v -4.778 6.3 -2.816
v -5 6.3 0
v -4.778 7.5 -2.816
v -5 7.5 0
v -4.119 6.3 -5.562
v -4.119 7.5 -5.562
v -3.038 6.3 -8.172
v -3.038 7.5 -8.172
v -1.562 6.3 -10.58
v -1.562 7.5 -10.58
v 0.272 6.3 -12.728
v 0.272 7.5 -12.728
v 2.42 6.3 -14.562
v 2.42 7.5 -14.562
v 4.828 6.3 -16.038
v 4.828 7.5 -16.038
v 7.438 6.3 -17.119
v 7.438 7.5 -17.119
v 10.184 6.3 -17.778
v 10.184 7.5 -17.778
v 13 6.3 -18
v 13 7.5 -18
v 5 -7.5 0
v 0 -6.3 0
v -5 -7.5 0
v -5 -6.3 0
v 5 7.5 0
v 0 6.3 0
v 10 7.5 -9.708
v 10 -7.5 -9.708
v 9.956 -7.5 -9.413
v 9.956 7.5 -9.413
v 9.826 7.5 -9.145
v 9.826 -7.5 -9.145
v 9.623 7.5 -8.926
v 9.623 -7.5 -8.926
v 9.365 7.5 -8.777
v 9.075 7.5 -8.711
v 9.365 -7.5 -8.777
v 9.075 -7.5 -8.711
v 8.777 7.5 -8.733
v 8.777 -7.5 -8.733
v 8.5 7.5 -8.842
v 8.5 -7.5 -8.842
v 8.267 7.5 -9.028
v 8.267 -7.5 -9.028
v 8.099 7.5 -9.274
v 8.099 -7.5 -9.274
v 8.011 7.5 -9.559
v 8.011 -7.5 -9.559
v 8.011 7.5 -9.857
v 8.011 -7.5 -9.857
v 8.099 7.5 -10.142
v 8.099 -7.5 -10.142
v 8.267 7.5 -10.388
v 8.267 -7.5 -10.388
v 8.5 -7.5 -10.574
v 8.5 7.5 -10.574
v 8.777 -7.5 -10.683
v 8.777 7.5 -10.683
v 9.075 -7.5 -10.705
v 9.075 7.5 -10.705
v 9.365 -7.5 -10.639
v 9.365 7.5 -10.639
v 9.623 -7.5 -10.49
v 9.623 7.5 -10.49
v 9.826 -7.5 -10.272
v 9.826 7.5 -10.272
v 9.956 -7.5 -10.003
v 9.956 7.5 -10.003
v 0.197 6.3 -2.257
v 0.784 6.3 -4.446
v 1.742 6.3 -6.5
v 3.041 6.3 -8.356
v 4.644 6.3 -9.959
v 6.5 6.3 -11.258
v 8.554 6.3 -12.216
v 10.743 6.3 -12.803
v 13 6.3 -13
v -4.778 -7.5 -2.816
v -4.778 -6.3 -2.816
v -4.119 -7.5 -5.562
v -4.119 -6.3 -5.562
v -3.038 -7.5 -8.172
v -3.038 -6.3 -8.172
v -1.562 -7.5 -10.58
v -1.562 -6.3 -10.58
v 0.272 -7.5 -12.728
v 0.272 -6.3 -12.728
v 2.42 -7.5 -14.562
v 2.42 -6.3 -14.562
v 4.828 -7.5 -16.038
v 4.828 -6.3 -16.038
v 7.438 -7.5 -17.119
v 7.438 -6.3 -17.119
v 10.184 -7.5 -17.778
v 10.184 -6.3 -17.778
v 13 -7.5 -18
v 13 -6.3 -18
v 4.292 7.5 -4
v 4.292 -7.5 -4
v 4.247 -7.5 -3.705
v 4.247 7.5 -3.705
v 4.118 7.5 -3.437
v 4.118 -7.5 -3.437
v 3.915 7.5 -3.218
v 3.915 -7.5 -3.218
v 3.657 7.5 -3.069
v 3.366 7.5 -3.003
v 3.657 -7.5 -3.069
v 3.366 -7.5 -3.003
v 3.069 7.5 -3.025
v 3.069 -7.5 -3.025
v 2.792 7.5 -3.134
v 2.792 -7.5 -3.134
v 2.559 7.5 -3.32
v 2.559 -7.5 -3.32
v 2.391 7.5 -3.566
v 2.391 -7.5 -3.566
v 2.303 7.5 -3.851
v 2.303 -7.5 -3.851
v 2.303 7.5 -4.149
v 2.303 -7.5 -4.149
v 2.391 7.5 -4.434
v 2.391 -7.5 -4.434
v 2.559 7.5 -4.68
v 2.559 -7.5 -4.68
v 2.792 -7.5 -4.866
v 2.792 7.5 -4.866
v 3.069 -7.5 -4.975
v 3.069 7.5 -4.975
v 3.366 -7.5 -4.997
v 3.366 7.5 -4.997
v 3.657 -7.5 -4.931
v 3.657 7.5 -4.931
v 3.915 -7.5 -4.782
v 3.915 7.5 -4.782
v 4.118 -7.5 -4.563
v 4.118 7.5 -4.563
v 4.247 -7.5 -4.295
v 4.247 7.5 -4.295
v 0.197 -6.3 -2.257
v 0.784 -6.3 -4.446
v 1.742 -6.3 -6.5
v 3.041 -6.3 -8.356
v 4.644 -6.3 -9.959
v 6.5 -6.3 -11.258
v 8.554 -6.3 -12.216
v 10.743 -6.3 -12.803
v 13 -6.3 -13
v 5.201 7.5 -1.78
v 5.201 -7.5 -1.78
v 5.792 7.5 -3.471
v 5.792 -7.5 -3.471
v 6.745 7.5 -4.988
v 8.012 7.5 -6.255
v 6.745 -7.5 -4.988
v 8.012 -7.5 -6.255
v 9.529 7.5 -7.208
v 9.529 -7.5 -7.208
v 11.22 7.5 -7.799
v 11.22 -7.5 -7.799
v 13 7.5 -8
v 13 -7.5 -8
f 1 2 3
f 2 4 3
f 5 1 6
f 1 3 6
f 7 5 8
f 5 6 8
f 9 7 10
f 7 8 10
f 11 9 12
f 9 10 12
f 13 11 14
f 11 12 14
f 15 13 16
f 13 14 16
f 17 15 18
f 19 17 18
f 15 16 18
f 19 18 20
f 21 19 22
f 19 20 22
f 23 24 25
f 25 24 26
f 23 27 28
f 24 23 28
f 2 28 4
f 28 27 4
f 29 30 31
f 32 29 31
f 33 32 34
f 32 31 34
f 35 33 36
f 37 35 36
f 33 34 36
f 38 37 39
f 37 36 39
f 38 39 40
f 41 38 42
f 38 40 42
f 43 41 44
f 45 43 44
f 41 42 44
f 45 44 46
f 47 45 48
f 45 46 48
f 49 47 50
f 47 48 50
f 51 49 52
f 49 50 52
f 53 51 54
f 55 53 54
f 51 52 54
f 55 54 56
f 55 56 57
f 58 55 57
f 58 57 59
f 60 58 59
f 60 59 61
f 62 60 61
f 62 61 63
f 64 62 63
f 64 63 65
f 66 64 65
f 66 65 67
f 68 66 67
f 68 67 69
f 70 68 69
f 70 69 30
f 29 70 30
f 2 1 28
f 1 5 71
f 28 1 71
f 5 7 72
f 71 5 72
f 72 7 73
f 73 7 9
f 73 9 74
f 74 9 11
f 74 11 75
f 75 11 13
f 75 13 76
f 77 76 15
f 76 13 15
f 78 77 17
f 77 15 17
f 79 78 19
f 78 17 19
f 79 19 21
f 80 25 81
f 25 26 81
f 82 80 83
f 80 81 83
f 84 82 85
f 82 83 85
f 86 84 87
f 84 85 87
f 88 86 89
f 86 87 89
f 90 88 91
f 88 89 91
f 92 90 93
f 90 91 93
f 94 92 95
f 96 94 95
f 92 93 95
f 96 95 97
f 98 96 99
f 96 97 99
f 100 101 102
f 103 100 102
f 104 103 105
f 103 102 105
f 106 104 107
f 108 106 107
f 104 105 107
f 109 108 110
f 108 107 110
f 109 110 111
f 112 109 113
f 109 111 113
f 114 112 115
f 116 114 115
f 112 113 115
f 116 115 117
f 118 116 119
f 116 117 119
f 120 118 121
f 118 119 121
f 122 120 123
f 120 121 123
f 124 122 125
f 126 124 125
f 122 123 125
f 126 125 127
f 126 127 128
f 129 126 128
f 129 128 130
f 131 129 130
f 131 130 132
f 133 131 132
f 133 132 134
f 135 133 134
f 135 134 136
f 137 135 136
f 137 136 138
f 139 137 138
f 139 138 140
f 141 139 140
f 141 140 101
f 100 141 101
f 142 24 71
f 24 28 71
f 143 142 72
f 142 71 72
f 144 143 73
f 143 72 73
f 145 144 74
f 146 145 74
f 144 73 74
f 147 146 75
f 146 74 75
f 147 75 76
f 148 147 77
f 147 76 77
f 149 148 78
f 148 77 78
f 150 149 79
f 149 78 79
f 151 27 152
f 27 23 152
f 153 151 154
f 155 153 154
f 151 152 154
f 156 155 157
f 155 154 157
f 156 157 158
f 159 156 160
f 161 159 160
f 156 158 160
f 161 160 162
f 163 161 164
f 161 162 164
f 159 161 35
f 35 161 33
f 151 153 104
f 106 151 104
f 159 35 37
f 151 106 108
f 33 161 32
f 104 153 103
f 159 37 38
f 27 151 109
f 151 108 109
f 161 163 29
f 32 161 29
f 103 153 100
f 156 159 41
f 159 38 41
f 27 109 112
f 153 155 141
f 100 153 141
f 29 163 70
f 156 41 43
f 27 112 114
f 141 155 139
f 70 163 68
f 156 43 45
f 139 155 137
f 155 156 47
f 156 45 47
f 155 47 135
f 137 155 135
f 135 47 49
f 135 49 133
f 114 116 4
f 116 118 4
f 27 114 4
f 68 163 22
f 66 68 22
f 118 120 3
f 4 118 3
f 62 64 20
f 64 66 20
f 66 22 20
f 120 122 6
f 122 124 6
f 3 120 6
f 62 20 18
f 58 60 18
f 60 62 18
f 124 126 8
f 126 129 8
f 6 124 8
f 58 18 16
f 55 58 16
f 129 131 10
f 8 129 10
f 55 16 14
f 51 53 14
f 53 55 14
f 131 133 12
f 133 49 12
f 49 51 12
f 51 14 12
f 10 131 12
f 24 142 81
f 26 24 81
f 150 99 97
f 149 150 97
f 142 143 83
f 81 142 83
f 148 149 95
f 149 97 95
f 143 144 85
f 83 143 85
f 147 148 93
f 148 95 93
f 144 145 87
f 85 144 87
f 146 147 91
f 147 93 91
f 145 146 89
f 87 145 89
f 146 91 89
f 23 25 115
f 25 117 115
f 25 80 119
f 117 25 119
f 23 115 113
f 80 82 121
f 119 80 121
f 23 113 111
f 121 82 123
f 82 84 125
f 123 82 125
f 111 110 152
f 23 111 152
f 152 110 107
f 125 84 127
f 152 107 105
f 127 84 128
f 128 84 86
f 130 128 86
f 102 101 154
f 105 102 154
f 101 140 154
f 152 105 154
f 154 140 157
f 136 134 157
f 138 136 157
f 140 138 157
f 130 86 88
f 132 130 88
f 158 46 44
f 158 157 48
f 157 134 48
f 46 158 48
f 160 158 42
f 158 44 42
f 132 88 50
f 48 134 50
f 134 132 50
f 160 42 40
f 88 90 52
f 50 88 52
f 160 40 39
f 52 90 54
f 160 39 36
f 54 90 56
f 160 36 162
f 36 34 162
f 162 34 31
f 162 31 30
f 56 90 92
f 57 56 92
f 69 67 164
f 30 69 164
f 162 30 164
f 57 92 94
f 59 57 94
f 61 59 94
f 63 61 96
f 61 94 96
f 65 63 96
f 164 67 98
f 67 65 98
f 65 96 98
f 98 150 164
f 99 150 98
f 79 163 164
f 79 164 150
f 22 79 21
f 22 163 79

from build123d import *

# Parameters (mm, degrees)
REVOLVE_1_ANGLE     = 90
SKETCH_2_R          = 1
CUT_EXTRUDE_1_DEPTH = 27.795522014


with BuildPart() as part:
    # 草图1 → 旋转1 (revolve)
    with BuildSketch(Plane.XY):
        Polygon((-5, 7.5), (5, 7.5), (5, -7.5), (-5, -7.5), (-5, -6.3), (0, -6.3), (0, 6.3), (-5, 6.3), align=None)
    revolve(axis=Axis((13, 23.403849413, 0), (0, -1, 0)), revolution_arc=REVOLVE_1_ANGLE)

    # 草图2 → 切除-拉伸1 (cut, through all)
    with BuildSketch(Plane.XZ.offset(7.5)):
        with Locations((3.291756081, -4)):
            Circle(SKETCH_2_R)
        with Locations((9, -9.708243919)):
            Circle(SKETCH_2_R)
    extrude(amount=-CUT_EXTRUDE_1_DEPTH, mode=Mode.SUBTRACT)


solid = part.part
